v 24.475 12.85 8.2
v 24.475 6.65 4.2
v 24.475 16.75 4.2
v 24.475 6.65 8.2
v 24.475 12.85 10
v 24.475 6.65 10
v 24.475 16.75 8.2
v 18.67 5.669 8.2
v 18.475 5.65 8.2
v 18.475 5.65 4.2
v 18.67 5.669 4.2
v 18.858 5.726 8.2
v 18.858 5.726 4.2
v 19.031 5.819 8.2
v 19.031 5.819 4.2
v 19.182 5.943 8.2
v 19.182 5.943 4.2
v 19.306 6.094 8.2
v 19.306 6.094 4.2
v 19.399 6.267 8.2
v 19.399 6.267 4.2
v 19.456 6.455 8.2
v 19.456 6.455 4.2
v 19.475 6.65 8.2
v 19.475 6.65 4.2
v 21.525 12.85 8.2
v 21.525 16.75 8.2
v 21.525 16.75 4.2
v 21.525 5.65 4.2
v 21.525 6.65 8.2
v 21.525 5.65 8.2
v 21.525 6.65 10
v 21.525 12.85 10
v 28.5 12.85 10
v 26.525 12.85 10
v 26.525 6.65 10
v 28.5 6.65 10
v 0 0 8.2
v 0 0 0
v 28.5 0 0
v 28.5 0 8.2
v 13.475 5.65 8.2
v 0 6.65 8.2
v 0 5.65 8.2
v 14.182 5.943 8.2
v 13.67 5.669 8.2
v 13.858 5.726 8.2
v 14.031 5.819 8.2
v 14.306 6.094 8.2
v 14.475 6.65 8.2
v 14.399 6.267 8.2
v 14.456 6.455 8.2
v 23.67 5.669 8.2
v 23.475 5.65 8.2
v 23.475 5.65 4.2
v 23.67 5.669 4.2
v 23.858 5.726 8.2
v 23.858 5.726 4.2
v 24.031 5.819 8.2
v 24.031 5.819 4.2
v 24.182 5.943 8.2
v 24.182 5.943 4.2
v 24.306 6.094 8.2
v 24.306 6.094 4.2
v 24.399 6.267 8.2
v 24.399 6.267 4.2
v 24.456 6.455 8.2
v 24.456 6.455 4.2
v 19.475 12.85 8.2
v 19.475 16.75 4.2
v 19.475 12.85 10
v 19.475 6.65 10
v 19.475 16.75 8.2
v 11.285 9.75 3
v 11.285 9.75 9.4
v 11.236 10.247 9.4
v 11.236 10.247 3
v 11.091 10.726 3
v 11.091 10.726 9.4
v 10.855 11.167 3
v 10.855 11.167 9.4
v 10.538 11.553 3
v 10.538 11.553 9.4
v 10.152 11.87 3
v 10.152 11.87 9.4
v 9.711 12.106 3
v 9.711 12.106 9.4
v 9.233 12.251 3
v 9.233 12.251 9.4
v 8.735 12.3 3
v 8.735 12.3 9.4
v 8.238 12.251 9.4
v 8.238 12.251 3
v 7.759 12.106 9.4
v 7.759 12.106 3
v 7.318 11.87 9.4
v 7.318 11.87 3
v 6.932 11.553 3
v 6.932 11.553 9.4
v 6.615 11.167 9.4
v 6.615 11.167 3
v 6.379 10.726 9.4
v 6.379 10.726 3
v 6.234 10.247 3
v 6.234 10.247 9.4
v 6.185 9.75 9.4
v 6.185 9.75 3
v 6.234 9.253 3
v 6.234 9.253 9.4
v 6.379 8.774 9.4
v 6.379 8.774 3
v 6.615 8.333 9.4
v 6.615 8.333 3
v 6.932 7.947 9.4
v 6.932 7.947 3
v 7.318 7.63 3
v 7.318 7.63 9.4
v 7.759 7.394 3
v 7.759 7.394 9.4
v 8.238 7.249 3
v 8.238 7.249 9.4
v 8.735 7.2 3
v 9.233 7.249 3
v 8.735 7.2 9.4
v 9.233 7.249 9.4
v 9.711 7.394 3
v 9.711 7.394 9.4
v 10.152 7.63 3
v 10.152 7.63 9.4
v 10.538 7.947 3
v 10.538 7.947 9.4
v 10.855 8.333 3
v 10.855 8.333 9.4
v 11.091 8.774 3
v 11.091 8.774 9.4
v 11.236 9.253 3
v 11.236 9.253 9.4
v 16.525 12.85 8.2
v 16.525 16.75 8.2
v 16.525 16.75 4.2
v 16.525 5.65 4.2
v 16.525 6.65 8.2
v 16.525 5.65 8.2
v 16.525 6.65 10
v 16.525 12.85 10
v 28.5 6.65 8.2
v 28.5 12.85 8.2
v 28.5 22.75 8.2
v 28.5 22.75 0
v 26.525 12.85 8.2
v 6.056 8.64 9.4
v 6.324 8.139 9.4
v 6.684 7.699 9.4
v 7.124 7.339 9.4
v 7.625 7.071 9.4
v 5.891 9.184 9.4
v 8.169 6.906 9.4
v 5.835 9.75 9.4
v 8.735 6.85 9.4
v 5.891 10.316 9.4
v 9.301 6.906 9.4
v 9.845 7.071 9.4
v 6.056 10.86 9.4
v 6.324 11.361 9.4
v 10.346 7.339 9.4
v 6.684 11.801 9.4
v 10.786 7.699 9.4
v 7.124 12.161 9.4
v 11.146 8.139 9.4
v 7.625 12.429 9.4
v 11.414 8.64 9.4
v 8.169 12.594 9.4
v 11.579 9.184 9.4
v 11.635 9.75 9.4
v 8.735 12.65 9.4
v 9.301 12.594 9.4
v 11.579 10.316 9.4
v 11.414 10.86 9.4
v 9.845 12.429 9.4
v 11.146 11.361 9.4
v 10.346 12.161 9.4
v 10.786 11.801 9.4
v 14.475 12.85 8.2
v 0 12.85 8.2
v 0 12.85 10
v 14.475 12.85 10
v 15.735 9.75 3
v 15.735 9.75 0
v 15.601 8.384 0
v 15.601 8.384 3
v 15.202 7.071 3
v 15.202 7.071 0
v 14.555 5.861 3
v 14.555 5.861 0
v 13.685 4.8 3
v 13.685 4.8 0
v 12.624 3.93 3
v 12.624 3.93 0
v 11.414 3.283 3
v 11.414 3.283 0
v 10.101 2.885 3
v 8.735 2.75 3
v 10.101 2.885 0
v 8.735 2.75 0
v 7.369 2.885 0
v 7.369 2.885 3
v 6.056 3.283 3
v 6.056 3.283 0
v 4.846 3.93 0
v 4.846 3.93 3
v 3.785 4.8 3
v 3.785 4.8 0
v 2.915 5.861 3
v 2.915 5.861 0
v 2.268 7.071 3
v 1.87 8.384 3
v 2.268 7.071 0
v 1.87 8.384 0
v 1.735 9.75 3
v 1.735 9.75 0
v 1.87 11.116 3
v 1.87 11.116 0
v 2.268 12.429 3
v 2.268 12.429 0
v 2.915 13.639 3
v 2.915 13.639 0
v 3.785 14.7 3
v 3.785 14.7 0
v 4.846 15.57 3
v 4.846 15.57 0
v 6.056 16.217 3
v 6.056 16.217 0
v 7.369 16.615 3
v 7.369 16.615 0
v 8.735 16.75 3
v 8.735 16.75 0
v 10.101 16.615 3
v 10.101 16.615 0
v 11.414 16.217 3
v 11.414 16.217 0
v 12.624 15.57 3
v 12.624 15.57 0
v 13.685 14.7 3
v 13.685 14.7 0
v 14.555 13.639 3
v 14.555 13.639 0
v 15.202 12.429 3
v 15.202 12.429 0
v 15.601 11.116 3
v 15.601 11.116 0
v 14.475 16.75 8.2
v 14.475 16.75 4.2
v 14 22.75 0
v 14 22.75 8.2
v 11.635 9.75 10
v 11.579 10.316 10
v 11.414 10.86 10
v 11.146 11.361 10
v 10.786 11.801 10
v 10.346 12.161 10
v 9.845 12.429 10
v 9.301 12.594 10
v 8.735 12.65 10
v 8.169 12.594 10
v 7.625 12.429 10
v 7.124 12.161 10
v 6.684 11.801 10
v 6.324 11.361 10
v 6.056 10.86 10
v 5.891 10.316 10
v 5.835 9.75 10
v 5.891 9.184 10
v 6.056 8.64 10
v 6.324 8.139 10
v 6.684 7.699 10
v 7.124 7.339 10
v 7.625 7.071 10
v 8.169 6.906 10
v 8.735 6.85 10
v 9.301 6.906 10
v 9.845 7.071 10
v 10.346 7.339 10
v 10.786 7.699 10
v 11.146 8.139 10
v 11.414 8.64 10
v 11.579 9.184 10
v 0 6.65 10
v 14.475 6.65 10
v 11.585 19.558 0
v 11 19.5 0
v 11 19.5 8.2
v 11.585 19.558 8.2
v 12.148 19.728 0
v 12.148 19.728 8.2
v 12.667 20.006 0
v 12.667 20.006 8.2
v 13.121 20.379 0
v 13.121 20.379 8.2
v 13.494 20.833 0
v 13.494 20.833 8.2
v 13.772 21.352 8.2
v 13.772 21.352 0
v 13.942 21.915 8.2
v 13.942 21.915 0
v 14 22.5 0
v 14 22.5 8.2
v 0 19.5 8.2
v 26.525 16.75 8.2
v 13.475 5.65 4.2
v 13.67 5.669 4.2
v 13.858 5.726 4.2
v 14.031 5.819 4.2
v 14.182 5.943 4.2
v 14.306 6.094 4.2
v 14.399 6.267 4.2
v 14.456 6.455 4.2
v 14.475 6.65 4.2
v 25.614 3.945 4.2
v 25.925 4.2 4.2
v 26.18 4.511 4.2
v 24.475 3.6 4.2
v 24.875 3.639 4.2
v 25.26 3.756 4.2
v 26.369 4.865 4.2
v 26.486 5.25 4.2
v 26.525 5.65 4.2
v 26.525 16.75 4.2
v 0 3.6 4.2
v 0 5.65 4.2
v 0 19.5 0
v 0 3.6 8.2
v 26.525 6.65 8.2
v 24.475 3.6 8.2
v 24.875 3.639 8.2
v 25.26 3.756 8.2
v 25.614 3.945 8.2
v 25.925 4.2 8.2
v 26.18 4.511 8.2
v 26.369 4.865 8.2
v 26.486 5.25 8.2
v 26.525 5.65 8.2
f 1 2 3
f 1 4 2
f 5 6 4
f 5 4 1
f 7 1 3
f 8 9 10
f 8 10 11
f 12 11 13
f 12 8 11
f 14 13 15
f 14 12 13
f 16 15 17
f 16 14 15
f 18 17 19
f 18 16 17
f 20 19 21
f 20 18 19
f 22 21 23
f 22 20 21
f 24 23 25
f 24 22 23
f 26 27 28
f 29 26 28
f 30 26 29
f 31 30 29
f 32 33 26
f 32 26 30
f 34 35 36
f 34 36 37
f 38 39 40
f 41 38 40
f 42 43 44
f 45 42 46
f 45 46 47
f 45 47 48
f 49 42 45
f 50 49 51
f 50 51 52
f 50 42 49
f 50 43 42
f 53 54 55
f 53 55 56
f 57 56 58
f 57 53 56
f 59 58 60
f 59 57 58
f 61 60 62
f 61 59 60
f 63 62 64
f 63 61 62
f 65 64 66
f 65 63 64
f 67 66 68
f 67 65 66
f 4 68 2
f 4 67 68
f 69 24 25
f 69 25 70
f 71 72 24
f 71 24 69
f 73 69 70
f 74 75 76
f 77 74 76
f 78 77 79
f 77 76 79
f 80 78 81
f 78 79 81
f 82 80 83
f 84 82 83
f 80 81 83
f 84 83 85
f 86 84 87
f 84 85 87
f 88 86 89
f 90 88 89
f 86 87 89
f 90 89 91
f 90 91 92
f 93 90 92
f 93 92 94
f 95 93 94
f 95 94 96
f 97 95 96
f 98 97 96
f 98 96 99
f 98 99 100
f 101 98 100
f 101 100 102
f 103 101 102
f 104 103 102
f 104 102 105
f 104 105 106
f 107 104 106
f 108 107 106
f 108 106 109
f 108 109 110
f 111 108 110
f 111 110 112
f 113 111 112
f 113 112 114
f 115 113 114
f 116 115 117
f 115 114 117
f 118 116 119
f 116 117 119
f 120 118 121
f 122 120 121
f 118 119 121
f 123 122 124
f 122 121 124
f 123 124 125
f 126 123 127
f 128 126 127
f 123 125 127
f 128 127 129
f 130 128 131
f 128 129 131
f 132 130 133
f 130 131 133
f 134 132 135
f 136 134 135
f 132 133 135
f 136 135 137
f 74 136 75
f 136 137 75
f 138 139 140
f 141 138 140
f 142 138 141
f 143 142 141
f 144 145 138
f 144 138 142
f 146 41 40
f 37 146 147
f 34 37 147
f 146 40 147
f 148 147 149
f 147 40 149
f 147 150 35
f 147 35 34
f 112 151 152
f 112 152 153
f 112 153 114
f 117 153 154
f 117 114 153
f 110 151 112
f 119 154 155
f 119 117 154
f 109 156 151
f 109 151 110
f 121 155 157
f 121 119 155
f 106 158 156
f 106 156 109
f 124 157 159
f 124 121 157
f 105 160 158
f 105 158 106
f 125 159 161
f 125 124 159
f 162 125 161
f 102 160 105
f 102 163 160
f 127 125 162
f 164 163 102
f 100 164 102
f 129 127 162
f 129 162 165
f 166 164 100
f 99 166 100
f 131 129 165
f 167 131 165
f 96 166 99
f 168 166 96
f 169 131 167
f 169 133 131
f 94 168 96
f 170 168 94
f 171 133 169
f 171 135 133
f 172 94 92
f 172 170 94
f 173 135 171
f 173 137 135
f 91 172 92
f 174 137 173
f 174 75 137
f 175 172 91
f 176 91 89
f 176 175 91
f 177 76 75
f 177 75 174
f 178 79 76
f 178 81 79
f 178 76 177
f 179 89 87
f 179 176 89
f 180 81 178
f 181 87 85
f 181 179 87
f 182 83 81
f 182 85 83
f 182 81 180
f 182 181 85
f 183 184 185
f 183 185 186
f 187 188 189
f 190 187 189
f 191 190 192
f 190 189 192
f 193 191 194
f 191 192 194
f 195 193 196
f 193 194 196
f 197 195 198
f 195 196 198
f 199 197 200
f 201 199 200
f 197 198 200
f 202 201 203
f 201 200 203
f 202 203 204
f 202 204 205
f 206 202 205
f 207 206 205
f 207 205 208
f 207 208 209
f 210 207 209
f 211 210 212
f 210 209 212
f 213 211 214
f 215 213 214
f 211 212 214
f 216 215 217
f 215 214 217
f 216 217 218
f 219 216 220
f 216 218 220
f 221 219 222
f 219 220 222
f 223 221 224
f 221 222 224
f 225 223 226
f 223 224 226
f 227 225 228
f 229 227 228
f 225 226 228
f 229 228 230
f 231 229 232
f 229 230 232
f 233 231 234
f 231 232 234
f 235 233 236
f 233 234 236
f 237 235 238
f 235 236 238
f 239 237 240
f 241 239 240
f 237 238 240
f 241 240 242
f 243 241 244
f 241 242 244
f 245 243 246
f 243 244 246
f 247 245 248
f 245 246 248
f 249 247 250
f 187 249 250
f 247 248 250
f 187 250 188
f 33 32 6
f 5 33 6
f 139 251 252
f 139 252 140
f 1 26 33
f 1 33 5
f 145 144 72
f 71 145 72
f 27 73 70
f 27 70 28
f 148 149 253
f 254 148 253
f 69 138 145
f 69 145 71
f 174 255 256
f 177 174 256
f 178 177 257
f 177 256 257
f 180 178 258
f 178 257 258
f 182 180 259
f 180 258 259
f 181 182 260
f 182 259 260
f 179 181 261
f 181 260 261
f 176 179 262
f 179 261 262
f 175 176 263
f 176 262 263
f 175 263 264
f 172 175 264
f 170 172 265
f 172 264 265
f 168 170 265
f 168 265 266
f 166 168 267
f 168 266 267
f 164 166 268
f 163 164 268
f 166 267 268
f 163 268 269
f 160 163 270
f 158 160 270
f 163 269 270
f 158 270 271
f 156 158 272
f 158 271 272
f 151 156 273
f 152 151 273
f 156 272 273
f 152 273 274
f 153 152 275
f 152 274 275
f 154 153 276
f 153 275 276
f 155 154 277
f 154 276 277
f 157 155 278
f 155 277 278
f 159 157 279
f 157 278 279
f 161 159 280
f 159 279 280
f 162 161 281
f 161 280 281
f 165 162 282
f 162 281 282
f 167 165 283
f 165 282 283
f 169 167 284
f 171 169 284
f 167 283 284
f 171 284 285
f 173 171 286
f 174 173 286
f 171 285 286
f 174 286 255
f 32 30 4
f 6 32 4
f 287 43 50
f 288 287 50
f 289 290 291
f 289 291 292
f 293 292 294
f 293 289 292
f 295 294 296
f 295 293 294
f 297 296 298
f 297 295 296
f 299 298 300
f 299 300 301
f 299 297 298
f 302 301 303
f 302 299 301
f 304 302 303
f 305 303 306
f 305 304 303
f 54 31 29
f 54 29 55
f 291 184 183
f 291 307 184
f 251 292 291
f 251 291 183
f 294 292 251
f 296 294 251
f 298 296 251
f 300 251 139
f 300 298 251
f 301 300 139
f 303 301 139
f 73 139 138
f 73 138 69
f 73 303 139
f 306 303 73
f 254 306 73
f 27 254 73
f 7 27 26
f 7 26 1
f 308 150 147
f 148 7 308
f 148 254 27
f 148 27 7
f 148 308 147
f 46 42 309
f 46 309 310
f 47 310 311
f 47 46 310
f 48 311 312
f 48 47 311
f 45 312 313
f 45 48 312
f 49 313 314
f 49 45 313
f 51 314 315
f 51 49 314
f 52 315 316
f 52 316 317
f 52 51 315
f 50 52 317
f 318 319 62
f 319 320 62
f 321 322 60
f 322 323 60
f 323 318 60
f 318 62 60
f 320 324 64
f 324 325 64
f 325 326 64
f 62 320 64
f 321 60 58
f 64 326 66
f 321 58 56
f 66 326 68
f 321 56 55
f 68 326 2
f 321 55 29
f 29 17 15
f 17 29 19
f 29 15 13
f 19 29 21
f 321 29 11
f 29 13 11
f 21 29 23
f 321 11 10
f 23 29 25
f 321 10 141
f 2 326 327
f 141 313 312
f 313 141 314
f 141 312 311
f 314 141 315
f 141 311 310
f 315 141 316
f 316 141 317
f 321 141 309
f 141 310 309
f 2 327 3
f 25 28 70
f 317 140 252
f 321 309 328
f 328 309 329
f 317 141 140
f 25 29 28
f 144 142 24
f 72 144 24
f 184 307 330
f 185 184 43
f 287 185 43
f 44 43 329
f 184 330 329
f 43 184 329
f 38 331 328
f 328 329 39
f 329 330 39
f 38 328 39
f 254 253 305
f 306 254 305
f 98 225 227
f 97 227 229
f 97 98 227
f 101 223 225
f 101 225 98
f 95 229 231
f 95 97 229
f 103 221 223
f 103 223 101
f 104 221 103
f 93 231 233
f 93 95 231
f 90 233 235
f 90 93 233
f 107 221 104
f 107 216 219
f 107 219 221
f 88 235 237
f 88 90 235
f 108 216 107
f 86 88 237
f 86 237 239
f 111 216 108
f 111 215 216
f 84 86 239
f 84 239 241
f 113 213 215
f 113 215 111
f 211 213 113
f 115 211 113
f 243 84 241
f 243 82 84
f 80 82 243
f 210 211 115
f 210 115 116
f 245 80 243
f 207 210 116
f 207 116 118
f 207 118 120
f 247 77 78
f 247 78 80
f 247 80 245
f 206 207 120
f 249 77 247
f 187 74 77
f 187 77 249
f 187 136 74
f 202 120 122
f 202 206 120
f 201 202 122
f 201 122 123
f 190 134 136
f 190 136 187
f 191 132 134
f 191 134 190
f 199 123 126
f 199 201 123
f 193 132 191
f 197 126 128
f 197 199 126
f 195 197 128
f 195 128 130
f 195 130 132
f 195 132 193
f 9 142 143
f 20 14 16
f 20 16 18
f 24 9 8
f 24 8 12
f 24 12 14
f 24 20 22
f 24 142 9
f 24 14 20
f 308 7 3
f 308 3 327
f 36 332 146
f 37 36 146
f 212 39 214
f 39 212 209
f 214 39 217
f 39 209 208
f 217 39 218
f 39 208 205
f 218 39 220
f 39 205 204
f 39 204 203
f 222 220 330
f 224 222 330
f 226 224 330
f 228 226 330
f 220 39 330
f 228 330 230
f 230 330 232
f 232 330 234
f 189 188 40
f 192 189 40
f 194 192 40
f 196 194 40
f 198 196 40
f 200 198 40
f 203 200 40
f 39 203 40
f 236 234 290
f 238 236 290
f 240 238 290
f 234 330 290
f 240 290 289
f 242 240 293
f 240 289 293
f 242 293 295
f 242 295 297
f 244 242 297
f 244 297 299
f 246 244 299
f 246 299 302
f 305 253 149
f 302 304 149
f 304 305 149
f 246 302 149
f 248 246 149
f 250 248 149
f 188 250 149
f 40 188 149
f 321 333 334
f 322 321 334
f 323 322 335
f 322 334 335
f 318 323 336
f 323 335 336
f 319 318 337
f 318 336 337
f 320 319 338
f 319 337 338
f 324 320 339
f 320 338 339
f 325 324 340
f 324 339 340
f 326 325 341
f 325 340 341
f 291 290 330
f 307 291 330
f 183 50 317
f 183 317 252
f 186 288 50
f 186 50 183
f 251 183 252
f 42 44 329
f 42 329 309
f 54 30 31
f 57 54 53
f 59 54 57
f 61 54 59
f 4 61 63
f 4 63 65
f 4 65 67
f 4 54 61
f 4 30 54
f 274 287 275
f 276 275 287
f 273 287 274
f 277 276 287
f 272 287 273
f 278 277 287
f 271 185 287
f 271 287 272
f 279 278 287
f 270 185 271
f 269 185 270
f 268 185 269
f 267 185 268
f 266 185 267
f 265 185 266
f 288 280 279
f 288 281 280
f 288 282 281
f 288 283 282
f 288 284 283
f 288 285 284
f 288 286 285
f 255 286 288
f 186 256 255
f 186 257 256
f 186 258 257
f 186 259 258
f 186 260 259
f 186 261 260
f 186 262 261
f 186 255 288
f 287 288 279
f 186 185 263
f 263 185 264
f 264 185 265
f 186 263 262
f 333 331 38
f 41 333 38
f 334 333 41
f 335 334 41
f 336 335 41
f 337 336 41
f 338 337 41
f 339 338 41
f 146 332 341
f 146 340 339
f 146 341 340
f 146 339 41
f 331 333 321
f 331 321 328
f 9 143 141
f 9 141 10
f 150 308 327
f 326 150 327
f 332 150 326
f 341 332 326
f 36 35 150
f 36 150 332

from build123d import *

# Parameters (mm, degrees)
PAD004_DEPTH    = 8.2
SKETCH014_W     = 28.5
SKETCH014_H     = 6.2
PAD005_DEPTH    = 1.8
SKETCH015_R     = 2.9
POCKET004_DEPTH = 0.6
SKETCH016_W     = 2.05
SKETCH016_H     = 6.2
POCKET005_DEPTH = 1.8
POCKET006_DEPTH = 4
SKETCH019_R     = 2.55
POCKET008_DEPTH = 7.5
SKETCH020_R     = 7
POCKET_DEPTH    = 3


with BuildPart() as part:
    # Sketch013 → Pad004 (new body)
    with BuildSketch(Plane.XY):
        with BuildLine():
            Line((0, 0), (28.5, 0))
            Line((28.5, 0), (28.5, 22.75))
            Line((28.5, 22.75), (14, 22.75))
            Line((14, 22.75), (14, 22.5))
            ThreePointArc((11, 19.5), (13.12132, 20.37868), (14, 22.5))
            Line((11, 19.5), (0, 19.5))
            Line((0, 19.5), (0, 0))
        make_face()
    extrude(amount=PAD004_DEPTH)

    # Sketch014 (on Face9 of Pad004) → Pad005 (join)
    with BuildSketch(Plane.XY.offset(8.2)):
        with Locations((14.25, 9.75)):
            Rectangle(SKETCH014_W, SKETCH014_H)
    extrude(amount=PAD005_DEPTH)

    # Sketch015 (on Face11 of Pad005) → Pocket004 (cut)
    with BuildSketch(Plane.XY.offset(10)):
        with Locations((8.735056, 9.75)):
            Circle(SKETCH015_R)
    extrude(amount=-POCKET004_DEPTH, mode=Mode.SUBTRACT)

    # Sketch016 (on Face10 of Pocket004) → Pocket005 (cut)
    with BuildSketch(Plane.XY.offset(10)):
        with Locations((15.5, 9.75)):
            Rectangle(SKETCH016_W, SKETCH016_H)
        Polygon((21.525, 12.85), (21.525, 6.65), (19.475, 6.65), (19.475, 12.85), (20.5, 12.85), align=None)
        with Locations((25.5, 9.75)):
            Rectangle(SKETCH016_W, SKETCH016_H)
    extrude(amount=-POCKET005_DEPTH, mode=Mode.SUBTRACT)

    # Sketch017 (on Face19 of Clone) → Pocket006 (cut)
    with BuildSketch(Plane.XY.offset(8.2)):
        with BuildLine():
            Line((0, 5.65), (13.475, 5.65))
            ThreePointArc((13.475, 5.65), (14.182107, 5.942893), (14.475, 6.65))
            Line((14.475, 6.65), (14.475, 16.75))
            Line((14.475, 16.75), (16.525, 16.75))
            Line((16.525, 16.75), (16.525, 5.65))
            Line((16.525, 5.65), (18.475, 5.65))
            ThreePointArc((18.475, 5.65), (19.182107, 5.942893), (19.475, 6.65))
            Line((19.475, 6.65), (19.475, 16.75))
            Line((19.475, 16.75), (21.525, 16.75))
            Line((21.525, 16.75), (21.525, 5.649972))
            Line((21.525, 5.649972), (23.475, 5.649972))
            ThreePointArc((23.475, 5.649972), (24.182107, 5.942865), (24.475, 6.649972))
            Line((24.475, 6.649972), (24.475, 16.75))
            Line((24.475, 16.75), (26.525, 16.75))
            Line((26.525, 16.75), (26.525, 5.65))
            ThreePointArc((24.475, 3.6), (25.924569, 4.200431), (26.525, 5.65))
            Line((24.475, 3.6), (0, 3.6))
            Line((0, 3.6), (0, 5.65))
        make_face()
    extrude(amount=-POCKET006_DEPTH, mode=Mode.SUBTRACT)

    # Sketch019 (on Face37 of Pocket006) → Pocket008 (cut)
    with BuildSketch(Plane.XY.offset(9.4)):
        with Locations((8.735056, 9.75)):
            Circle(SKETCH019_R)
    extrude(amount=-POCKET008_DEPTH, mode=Mode.SUBTRACT)

    # Sketch020 (on Face4 of Pocket008) → Pocket (cut)
    with BuildSketch(Plane(origin=(0, 0, 0), x_dir=(1, 0, 0), z_dir=(0, 0, -1))):
        with Locations((8.735056, -9.75)):
            Circle(SKETCH020_R)
    extrude(amount=-POCKET_DEPTH, mode=Mode.SUBTRACT)


solid = part.part
